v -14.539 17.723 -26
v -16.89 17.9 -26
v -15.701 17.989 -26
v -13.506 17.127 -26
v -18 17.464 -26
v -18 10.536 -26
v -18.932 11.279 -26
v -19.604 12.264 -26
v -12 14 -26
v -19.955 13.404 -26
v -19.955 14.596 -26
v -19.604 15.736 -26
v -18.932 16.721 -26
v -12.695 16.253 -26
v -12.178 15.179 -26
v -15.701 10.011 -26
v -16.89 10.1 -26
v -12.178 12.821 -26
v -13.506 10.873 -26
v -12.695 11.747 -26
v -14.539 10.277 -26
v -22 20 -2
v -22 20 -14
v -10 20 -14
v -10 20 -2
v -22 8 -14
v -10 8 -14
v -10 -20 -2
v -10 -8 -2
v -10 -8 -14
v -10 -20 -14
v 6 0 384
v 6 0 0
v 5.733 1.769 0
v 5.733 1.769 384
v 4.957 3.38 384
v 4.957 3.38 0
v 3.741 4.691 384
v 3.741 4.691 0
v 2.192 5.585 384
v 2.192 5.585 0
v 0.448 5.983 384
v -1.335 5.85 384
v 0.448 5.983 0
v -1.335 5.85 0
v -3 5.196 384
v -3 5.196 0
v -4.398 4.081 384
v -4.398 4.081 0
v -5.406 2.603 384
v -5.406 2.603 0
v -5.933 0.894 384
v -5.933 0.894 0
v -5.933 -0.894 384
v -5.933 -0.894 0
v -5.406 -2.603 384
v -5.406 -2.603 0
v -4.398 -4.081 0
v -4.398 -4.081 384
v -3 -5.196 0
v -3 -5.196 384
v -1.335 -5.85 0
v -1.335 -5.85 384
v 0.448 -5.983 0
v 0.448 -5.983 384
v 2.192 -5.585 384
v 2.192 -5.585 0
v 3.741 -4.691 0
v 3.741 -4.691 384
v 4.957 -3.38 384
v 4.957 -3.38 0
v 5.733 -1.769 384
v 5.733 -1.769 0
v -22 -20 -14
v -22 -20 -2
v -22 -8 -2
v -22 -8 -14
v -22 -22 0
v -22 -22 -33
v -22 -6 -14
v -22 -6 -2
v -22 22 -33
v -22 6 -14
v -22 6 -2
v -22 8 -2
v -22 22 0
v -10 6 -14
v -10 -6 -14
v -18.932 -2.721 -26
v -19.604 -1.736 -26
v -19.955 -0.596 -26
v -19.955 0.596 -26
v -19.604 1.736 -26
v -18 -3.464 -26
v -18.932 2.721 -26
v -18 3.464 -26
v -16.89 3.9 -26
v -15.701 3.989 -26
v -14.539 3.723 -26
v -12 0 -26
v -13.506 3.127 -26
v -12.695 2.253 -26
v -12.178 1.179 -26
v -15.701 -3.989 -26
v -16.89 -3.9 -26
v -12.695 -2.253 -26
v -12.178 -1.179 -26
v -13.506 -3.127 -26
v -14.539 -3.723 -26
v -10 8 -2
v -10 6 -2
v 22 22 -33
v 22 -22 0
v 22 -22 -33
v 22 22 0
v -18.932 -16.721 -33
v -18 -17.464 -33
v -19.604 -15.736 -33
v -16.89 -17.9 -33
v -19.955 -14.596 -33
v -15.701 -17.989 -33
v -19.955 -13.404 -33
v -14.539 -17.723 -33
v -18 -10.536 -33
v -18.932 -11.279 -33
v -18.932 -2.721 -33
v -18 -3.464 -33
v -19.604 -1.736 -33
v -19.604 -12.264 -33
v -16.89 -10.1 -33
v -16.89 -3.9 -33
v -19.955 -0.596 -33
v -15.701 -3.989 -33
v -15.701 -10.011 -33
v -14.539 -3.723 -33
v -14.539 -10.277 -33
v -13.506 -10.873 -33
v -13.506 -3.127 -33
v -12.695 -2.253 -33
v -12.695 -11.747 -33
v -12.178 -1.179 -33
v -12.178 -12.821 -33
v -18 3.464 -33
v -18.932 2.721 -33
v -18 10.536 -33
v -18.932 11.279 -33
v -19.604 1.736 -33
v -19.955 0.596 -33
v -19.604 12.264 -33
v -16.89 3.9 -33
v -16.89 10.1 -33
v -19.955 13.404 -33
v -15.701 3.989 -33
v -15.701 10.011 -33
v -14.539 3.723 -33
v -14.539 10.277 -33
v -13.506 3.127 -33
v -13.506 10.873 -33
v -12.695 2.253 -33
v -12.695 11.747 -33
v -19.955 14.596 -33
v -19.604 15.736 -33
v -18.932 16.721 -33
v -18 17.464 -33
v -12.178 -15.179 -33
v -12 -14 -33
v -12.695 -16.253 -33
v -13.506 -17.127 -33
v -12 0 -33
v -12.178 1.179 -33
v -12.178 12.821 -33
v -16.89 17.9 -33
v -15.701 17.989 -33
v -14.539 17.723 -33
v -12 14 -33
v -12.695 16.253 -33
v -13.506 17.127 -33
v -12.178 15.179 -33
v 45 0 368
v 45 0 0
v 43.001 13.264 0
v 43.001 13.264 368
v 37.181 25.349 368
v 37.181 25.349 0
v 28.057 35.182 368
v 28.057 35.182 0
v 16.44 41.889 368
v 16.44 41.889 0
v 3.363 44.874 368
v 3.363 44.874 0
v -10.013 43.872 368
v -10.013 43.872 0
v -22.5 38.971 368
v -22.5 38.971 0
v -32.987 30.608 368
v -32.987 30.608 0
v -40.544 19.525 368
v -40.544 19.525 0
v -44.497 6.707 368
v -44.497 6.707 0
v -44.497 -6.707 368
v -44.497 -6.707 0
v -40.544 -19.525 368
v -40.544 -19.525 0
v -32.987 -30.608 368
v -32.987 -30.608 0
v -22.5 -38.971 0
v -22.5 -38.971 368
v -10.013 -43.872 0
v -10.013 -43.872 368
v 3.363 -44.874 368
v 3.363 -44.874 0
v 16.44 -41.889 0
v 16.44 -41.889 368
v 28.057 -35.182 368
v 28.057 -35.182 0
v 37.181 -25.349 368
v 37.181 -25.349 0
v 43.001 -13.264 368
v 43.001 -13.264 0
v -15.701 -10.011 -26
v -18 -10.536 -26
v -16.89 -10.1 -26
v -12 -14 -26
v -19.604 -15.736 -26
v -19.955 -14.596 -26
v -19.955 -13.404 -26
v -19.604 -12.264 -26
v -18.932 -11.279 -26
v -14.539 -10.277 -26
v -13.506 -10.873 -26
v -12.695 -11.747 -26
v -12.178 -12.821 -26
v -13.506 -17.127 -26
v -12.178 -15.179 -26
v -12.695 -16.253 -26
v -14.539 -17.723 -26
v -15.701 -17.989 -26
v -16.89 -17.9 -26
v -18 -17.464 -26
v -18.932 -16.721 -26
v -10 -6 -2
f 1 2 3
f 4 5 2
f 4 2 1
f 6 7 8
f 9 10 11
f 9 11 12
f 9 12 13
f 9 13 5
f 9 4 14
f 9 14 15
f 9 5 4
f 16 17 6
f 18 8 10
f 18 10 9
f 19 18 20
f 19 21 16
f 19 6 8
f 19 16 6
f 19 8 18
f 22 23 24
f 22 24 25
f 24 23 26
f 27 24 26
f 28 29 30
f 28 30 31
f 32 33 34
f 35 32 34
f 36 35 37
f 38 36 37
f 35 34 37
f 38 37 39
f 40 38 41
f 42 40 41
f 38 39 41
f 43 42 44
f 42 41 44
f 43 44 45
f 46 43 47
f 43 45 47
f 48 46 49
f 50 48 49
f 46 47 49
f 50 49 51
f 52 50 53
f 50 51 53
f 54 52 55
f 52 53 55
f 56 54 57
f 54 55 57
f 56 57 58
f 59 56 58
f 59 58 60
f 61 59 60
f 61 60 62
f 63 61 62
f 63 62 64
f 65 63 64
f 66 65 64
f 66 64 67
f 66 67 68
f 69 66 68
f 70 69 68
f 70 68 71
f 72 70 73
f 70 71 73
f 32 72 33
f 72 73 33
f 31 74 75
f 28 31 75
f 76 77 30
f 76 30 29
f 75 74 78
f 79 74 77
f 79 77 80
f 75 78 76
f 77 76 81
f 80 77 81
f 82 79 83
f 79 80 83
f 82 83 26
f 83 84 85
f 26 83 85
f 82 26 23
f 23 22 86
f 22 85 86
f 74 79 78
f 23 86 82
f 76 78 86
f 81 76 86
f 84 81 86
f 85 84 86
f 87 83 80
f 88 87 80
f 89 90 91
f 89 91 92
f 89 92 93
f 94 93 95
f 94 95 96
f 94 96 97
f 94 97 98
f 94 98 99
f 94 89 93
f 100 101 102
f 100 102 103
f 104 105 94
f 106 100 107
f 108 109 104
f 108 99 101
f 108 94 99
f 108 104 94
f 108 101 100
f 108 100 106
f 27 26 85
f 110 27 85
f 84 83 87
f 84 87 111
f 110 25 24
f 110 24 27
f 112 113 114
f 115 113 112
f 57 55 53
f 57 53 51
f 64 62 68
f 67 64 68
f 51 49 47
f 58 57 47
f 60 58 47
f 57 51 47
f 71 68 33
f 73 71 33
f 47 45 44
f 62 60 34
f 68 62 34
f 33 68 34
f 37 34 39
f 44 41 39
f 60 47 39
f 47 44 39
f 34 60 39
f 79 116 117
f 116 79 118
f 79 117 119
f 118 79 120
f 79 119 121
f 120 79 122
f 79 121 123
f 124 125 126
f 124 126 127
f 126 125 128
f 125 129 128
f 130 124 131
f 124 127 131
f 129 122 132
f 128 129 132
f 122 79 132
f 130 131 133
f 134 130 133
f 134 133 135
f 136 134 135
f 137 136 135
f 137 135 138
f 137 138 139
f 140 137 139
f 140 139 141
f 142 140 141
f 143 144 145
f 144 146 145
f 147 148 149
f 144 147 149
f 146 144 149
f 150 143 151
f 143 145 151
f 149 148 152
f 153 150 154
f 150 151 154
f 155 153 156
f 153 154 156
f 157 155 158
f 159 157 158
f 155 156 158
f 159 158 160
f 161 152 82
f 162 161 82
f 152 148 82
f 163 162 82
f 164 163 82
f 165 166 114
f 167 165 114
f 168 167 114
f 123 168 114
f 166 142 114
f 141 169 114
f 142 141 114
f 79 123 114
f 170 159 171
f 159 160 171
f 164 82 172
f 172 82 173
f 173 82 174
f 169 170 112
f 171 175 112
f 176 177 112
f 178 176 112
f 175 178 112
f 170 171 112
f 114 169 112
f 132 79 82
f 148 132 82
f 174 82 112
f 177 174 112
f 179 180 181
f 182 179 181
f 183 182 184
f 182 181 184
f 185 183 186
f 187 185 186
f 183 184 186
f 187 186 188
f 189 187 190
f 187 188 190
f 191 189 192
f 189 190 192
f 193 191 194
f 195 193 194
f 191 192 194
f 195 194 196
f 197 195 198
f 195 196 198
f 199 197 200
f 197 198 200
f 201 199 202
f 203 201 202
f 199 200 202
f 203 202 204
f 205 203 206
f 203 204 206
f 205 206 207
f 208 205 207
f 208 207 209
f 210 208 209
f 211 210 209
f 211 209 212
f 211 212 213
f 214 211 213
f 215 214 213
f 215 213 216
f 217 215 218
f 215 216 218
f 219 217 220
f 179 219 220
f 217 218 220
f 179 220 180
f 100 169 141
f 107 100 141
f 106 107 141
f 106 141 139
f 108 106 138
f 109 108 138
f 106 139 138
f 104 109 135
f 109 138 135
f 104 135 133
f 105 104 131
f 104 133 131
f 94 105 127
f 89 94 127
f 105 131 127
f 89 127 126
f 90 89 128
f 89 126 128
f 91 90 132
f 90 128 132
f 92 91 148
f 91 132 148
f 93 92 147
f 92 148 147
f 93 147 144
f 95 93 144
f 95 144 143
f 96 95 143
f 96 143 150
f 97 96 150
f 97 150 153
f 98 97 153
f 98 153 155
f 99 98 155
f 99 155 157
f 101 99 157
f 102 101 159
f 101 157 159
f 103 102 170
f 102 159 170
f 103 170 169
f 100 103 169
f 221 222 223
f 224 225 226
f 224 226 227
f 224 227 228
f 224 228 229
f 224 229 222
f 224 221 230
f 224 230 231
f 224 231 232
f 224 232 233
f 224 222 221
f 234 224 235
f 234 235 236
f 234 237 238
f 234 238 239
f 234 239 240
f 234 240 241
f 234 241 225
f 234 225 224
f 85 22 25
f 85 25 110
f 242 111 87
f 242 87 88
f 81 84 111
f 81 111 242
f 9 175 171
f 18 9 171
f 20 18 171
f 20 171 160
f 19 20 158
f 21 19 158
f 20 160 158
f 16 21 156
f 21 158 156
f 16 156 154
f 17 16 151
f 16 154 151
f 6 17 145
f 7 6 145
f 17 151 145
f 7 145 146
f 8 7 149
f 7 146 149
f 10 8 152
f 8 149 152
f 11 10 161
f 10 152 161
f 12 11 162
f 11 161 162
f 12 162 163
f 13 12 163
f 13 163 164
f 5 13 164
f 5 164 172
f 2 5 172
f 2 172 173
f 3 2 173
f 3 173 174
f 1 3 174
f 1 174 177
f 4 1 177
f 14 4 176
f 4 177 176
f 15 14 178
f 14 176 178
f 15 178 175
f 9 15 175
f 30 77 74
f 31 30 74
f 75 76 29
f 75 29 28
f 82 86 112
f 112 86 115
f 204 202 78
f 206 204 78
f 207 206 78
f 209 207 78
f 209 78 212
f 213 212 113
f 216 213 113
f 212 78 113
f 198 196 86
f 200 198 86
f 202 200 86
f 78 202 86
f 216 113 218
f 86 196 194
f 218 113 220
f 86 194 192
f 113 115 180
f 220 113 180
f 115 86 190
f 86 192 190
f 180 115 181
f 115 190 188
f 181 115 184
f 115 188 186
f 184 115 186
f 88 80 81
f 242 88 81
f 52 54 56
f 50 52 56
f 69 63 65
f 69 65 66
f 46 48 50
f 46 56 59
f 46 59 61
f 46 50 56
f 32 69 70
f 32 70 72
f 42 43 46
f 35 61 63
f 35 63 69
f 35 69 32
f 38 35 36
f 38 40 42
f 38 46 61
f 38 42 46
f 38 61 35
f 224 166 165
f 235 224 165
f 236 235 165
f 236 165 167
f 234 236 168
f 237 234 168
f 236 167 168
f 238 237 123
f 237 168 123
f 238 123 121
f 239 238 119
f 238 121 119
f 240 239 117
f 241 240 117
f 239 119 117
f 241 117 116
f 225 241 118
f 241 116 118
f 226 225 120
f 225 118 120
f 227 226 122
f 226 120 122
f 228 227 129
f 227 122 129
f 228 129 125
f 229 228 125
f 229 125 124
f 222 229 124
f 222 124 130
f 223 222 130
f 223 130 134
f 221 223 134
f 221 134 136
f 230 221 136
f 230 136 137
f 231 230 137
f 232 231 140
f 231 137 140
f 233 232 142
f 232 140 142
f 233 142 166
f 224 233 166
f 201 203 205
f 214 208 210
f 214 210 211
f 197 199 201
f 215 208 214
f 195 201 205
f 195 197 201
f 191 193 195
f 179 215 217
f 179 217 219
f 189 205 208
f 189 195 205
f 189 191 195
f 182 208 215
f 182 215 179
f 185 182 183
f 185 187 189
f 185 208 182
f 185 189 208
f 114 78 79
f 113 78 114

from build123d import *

# Parameters (mm, degrees)
F0_R     = 45
F0_W     = 44
F0_H     = 44
F0_R_2   = 6
F1_DEPTH = 368
F2_DEPTH = 33
F3_DEPTH = 384
F4_W     = 12
F4_H     = 12
F5_DEPTH = 12
F6_R     = 4
F7_DEPTH = 7


with BuildPart() as f1:
    # F0 (on Top) → F1 (new body)
    with BuildSketch(Plane.XY):
        Circle(F0_R)
        Rectangle(F0_W, F0_H, mode=Mode.SUBTRACT)
        Rectangle(F0_W, F0_H)
        Circle(F0_R_2, mode=Mode.SUBTRACT)
        Circle(F0_R_2)
    extrude(amount=F1_DEPTH)

    # F0 (on Top) → F2 (join)
    with BuildSketch(Plane.XY):
        Rectangle(F0_W, F0_H)
        Circle(F0_R_2, mode=Mode.SUBTRACT)
        Circle(F0_R_2)
    extrude(amount=-F2_DEPTH)

    # F4 (on face) → F5 (cut)
    with BuildSketch(Plane(origin=(-22, 0, 0), x_dir=(0, -1, 0), z_dir=(-1, 0, 0))):
        with Locations((14, -8)):
            Rectangle(F4_W, F4_H)
        with Locations((0, -8)):
            Rectangle(F4_W, F4_H)
        with Locations((-14, -8)):
            Rectangle(F4_W, F4_H)
    extrude(amount=-F5_DEPTH, mode=Mode.SUBTRACT)

    # F6 (on face) → F7 (cut)
    with BuildSketch(Plane(origin=(0, 0, -33), x_dir=(1, 0, 0), z_dir=(0, 0, -1))):
        with Locations((-16, 14)):
            Circle(F6_R)
        with Locations((-16, 0)):
            Circle(F6_R)
        with Locations((-16, -14)):
            Circle(F6_R)
    extrude(amount=-F7_DEPTH, mode=Mode.SUBTRACT)


with BuildPart() as f3:
    # F0 (on Top) → F3 (new body)
    with BuildSketch(Plane.XY):
        Circle(F0_R_2)
    extrude(amount=F3_DEPTH)


solid = Compound([f1.part, f3.part])
